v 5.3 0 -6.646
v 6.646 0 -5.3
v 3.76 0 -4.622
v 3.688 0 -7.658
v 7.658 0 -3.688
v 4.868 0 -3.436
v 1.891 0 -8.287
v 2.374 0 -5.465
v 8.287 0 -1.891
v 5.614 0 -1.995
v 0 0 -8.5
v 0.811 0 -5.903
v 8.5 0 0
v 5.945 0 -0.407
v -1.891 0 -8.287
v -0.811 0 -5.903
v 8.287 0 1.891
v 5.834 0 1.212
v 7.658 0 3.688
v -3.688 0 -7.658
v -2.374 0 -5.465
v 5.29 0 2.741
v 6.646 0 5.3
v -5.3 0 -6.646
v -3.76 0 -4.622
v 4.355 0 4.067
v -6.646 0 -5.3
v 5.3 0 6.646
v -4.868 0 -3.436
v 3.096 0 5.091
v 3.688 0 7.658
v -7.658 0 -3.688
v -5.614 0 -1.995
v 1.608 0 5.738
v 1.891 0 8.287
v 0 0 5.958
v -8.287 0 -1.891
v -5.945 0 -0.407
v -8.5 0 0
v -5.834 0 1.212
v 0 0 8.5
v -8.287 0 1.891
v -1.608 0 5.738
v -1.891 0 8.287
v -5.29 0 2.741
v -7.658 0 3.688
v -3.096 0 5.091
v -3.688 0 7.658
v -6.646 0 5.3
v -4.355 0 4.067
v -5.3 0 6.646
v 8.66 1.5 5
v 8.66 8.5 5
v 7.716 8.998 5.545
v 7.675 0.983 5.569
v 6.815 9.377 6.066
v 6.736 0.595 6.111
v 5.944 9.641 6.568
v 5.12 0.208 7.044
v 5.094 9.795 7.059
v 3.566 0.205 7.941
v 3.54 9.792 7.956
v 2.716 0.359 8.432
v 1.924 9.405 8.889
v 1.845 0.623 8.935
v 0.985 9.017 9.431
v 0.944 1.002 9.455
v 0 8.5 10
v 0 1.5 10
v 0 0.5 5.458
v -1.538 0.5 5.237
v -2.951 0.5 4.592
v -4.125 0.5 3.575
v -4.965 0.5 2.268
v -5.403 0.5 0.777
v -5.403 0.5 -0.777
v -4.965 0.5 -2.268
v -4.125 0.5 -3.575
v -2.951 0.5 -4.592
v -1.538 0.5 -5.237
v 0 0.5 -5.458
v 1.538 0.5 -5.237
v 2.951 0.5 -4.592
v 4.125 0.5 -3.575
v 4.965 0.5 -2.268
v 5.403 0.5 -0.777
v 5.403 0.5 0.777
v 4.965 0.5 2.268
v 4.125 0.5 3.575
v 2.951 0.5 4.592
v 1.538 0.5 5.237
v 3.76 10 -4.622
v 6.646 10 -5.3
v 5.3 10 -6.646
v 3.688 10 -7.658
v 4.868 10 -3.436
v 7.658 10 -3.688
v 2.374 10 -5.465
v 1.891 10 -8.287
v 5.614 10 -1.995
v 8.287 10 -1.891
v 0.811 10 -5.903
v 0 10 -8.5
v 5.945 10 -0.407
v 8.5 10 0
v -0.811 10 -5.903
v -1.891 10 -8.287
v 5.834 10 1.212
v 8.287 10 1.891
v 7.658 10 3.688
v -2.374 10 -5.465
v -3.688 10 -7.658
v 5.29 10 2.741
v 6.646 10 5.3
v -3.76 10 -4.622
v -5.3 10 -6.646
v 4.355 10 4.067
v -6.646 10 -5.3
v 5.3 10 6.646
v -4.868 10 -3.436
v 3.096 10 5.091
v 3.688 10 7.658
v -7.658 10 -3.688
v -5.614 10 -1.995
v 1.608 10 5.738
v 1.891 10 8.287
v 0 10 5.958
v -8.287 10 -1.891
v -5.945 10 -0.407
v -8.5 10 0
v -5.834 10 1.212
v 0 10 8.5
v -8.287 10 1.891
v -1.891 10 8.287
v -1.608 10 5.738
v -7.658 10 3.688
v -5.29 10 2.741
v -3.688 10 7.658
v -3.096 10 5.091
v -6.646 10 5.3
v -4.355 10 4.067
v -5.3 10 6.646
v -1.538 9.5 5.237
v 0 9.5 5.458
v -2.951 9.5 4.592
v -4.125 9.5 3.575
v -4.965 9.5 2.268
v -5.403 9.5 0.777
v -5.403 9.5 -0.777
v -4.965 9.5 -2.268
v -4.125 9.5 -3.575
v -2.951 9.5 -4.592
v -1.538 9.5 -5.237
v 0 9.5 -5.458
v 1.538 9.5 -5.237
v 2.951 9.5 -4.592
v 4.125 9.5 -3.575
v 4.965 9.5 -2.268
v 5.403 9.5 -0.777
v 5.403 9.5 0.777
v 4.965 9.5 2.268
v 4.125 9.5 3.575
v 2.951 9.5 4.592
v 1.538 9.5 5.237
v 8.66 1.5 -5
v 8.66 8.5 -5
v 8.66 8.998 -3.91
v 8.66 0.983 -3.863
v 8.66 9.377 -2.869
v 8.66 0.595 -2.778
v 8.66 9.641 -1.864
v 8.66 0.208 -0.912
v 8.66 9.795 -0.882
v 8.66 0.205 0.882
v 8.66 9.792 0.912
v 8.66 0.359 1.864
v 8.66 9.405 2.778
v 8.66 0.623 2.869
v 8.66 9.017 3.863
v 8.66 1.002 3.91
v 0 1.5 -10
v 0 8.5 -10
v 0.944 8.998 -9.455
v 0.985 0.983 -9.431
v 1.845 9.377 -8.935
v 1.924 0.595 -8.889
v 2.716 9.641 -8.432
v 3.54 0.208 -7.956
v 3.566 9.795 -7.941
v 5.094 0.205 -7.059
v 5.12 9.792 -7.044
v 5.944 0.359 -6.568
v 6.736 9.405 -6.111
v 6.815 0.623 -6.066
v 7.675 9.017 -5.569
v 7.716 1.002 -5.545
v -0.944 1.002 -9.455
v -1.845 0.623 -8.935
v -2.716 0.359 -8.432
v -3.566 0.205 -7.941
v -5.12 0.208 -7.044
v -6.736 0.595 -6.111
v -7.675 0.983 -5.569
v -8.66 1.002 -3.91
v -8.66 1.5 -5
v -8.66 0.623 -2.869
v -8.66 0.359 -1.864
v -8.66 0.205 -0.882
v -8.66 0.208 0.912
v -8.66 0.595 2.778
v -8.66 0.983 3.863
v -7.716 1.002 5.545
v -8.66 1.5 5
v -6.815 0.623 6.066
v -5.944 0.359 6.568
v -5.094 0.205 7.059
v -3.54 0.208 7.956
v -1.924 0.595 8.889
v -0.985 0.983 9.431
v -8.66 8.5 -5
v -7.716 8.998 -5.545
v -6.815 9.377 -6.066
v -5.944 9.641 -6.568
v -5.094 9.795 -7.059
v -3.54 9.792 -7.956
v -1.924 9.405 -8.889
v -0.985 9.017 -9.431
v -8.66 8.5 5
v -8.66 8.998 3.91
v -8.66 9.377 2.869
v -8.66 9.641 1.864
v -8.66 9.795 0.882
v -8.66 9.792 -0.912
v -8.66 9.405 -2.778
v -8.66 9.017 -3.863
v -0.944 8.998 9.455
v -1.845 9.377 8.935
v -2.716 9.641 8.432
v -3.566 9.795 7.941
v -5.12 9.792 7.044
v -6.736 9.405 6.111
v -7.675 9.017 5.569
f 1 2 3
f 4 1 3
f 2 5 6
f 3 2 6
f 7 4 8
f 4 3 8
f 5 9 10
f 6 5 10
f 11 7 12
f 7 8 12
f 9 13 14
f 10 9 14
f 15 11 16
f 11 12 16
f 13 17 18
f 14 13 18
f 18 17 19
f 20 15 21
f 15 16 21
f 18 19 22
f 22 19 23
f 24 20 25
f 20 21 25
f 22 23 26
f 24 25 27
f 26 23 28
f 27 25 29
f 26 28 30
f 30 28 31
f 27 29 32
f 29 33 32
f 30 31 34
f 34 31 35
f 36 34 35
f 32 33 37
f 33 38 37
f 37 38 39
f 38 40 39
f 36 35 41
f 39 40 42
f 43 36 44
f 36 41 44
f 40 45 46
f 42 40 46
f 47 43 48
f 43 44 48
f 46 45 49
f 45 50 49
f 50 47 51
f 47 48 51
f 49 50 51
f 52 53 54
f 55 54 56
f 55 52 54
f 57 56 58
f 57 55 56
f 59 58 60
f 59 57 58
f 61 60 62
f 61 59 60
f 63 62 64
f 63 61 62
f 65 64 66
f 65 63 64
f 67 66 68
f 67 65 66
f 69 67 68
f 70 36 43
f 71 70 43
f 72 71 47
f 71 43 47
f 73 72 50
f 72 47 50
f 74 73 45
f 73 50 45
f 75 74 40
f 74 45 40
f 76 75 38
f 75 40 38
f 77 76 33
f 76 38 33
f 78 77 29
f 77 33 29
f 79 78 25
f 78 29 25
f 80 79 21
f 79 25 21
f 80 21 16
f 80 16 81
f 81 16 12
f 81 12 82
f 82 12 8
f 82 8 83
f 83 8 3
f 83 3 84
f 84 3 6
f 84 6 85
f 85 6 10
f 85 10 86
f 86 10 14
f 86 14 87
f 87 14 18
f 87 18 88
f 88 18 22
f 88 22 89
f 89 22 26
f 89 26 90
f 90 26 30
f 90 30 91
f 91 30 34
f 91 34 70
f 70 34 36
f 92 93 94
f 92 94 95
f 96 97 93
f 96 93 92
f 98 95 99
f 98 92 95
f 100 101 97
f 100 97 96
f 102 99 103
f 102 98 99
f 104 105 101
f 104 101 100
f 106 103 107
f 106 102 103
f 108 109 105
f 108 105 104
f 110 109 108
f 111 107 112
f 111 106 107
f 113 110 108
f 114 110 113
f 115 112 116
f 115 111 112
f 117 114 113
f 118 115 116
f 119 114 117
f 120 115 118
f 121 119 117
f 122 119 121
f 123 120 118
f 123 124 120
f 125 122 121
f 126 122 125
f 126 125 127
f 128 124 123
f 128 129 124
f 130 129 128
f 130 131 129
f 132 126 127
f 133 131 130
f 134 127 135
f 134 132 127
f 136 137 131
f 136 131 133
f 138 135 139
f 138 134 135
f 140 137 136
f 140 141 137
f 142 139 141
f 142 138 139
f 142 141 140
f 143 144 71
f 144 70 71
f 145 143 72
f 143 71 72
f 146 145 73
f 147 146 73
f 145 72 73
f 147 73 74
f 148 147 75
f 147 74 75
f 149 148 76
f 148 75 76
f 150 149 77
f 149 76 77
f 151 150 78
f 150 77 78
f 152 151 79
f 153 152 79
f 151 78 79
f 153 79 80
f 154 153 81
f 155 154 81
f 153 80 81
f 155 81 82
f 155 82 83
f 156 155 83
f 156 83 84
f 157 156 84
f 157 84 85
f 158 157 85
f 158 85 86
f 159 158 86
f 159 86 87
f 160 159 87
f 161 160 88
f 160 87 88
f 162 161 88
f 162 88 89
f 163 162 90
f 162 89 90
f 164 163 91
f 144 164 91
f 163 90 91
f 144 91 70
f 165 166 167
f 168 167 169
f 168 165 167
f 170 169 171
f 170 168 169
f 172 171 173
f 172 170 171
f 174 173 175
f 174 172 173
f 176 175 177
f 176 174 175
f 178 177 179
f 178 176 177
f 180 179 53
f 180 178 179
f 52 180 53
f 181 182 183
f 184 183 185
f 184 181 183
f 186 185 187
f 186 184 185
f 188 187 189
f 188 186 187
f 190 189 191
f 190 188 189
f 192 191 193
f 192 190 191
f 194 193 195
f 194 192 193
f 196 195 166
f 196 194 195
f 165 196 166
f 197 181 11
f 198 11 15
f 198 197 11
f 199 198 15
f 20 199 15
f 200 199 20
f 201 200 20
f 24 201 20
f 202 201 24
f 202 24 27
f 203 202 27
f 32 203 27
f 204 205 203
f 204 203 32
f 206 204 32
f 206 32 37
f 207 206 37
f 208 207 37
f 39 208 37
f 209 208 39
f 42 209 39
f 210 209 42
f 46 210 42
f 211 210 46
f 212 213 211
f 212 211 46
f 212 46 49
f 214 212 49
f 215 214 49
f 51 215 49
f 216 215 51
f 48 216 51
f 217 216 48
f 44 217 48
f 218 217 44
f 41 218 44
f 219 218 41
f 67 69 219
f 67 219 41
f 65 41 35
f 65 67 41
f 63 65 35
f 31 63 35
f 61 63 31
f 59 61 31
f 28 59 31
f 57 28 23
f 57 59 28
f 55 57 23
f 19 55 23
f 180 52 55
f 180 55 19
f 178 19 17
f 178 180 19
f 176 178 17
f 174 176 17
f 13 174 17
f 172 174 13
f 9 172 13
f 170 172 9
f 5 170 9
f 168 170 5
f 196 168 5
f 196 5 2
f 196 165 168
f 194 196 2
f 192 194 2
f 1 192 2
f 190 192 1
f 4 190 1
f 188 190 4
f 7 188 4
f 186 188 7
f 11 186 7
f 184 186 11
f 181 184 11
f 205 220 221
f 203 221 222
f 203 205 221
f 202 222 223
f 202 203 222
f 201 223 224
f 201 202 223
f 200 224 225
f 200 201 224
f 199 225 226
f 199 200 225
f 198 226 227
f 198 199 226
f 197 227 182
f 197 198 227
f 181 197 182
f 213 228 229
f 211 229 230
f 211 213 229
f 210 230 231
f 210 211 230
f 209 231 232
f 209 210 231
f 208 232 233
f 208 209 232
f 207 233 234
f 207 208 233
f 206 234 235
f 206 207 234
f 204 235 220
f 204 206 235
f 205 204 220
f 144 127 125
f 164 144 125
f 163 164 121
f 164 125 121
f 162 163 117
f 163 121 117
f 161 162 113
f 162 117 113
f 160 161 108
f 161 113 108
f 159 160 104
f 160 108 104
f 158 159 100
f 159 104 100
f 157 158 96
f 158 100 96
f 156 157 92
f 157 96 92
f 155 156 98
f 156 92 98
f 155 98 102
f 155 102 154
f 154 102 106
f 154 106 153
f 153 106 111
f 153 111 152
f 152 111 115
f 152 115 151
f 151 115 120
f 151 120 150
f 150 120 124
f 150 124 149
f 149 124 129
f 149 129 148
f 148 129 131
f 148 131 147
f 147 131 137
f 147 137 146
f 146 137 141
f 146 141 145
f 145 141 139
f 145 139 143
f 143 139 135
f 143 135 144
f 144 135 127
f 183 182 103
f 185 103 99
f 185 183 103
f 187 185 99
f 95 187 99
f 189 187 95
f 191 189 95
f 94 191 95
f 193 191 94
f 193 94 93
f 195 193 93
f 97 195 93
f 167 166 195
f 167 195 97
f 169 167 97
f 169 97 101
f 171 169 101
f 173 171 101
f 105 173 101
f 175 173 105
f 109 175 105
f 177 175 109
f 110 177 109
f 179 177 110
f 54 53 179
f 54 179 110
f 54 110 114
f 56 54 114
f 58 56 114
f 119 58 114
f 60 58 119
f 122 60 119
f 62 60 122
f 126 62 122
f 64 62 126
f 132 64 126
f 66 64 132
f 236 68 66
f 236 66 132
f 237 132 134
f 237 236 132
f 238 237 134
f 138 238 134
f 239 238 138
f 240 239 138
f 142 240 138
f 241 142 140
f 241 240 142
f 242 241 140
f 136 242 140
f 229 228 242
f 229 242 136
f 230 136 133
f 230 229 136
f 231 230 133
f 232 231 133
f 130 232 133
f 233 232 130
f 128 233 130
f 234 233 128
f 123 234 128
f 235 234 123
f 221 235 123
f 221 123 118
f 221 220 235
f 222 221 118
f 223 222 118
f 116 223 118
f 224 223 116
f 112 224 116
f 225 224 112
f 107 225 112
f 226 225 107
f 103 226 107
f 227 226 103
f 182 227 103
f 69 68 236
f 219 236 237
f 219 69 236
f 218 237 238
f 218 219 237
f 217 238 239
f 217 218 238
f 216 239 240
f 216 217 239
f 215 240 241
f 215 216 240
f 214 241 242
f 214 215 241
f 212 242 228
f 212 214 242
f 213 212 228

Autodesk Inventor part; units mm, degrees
ref_plane "YZ Plane" through (0, 0, 0) normal (1, 0, 0) x (0, 1, 0)
ref_plane "XZ Plane" through (0, 0, 0) normal (0, 1, 0) x (-1, 0, 0)
sketch "Sketch1" plane through (0, 0, 0) normal (0, 1, 0) x (-1, 0, 0)
  line L0 (0, -10) -> (-8.6603, -5)
  line L1 (-8.6603, -5) -> (-8.6603, 5)
  line L2 (-8.6603, 5) -> (0, 10)
  line L3 (0, 10) -> (8.6603, 5)
  line L4 (8.6603, 5) -> (8.6603, -5)
  line L5 (8.6603, -5) -> (0, -10)
  point P0 (0, 0)
  point P1 (0, 0)
  dimension "d1" = 20
extrude "Extrusion1" add sketch "Sketch1" along normal blind 10
sketch "Sketch2" plane through (0, 0, 0) normal (1, 0, 0) x (0, 1, 0)
  line L0 (10, -5) -> (10, -10) projected
  line L1 (10, -10) -> (8.5, -10)
  line L2 (10, -8.5) -> (10, -10)
  line L3 (8.5, -10) -> (10, -8.5)
  line L4 (-2, 0) -> (12, 0) projected
  point P0 (0, 0)
revolve "Revolution1" cut sketch "Sketch2" angle 360 about axis through (0, -10, 0) along (0, 1, 0)
ref_plane "Work Plane1" through (0, 5, 0) normal (0, 1, 0) x (1, 0, 0)
mirror "Mirror1" about plane through (0, 5, 0) normal (0, 1, 0) of "Revolution1"
sketch "Sketch3" plane through (0, 10, 0) normal (0, 1, 0) x (1, 0, 0)
  circle A0 centre (0, 0) radius 8.5 projected
hole "Hole1" at (0, 10, 0) direction (0, -1, 0) diameter 10.917 depth 29.1 tip angle 118 thread size "M12x1" class "6H" standard "ISO Metric profile"
chamfer "Chamfer1" distance 0.5 angle 45 2 edges at (0, 10, -5.4585) (0, 0, -5.4585)
properties part number "nut"
